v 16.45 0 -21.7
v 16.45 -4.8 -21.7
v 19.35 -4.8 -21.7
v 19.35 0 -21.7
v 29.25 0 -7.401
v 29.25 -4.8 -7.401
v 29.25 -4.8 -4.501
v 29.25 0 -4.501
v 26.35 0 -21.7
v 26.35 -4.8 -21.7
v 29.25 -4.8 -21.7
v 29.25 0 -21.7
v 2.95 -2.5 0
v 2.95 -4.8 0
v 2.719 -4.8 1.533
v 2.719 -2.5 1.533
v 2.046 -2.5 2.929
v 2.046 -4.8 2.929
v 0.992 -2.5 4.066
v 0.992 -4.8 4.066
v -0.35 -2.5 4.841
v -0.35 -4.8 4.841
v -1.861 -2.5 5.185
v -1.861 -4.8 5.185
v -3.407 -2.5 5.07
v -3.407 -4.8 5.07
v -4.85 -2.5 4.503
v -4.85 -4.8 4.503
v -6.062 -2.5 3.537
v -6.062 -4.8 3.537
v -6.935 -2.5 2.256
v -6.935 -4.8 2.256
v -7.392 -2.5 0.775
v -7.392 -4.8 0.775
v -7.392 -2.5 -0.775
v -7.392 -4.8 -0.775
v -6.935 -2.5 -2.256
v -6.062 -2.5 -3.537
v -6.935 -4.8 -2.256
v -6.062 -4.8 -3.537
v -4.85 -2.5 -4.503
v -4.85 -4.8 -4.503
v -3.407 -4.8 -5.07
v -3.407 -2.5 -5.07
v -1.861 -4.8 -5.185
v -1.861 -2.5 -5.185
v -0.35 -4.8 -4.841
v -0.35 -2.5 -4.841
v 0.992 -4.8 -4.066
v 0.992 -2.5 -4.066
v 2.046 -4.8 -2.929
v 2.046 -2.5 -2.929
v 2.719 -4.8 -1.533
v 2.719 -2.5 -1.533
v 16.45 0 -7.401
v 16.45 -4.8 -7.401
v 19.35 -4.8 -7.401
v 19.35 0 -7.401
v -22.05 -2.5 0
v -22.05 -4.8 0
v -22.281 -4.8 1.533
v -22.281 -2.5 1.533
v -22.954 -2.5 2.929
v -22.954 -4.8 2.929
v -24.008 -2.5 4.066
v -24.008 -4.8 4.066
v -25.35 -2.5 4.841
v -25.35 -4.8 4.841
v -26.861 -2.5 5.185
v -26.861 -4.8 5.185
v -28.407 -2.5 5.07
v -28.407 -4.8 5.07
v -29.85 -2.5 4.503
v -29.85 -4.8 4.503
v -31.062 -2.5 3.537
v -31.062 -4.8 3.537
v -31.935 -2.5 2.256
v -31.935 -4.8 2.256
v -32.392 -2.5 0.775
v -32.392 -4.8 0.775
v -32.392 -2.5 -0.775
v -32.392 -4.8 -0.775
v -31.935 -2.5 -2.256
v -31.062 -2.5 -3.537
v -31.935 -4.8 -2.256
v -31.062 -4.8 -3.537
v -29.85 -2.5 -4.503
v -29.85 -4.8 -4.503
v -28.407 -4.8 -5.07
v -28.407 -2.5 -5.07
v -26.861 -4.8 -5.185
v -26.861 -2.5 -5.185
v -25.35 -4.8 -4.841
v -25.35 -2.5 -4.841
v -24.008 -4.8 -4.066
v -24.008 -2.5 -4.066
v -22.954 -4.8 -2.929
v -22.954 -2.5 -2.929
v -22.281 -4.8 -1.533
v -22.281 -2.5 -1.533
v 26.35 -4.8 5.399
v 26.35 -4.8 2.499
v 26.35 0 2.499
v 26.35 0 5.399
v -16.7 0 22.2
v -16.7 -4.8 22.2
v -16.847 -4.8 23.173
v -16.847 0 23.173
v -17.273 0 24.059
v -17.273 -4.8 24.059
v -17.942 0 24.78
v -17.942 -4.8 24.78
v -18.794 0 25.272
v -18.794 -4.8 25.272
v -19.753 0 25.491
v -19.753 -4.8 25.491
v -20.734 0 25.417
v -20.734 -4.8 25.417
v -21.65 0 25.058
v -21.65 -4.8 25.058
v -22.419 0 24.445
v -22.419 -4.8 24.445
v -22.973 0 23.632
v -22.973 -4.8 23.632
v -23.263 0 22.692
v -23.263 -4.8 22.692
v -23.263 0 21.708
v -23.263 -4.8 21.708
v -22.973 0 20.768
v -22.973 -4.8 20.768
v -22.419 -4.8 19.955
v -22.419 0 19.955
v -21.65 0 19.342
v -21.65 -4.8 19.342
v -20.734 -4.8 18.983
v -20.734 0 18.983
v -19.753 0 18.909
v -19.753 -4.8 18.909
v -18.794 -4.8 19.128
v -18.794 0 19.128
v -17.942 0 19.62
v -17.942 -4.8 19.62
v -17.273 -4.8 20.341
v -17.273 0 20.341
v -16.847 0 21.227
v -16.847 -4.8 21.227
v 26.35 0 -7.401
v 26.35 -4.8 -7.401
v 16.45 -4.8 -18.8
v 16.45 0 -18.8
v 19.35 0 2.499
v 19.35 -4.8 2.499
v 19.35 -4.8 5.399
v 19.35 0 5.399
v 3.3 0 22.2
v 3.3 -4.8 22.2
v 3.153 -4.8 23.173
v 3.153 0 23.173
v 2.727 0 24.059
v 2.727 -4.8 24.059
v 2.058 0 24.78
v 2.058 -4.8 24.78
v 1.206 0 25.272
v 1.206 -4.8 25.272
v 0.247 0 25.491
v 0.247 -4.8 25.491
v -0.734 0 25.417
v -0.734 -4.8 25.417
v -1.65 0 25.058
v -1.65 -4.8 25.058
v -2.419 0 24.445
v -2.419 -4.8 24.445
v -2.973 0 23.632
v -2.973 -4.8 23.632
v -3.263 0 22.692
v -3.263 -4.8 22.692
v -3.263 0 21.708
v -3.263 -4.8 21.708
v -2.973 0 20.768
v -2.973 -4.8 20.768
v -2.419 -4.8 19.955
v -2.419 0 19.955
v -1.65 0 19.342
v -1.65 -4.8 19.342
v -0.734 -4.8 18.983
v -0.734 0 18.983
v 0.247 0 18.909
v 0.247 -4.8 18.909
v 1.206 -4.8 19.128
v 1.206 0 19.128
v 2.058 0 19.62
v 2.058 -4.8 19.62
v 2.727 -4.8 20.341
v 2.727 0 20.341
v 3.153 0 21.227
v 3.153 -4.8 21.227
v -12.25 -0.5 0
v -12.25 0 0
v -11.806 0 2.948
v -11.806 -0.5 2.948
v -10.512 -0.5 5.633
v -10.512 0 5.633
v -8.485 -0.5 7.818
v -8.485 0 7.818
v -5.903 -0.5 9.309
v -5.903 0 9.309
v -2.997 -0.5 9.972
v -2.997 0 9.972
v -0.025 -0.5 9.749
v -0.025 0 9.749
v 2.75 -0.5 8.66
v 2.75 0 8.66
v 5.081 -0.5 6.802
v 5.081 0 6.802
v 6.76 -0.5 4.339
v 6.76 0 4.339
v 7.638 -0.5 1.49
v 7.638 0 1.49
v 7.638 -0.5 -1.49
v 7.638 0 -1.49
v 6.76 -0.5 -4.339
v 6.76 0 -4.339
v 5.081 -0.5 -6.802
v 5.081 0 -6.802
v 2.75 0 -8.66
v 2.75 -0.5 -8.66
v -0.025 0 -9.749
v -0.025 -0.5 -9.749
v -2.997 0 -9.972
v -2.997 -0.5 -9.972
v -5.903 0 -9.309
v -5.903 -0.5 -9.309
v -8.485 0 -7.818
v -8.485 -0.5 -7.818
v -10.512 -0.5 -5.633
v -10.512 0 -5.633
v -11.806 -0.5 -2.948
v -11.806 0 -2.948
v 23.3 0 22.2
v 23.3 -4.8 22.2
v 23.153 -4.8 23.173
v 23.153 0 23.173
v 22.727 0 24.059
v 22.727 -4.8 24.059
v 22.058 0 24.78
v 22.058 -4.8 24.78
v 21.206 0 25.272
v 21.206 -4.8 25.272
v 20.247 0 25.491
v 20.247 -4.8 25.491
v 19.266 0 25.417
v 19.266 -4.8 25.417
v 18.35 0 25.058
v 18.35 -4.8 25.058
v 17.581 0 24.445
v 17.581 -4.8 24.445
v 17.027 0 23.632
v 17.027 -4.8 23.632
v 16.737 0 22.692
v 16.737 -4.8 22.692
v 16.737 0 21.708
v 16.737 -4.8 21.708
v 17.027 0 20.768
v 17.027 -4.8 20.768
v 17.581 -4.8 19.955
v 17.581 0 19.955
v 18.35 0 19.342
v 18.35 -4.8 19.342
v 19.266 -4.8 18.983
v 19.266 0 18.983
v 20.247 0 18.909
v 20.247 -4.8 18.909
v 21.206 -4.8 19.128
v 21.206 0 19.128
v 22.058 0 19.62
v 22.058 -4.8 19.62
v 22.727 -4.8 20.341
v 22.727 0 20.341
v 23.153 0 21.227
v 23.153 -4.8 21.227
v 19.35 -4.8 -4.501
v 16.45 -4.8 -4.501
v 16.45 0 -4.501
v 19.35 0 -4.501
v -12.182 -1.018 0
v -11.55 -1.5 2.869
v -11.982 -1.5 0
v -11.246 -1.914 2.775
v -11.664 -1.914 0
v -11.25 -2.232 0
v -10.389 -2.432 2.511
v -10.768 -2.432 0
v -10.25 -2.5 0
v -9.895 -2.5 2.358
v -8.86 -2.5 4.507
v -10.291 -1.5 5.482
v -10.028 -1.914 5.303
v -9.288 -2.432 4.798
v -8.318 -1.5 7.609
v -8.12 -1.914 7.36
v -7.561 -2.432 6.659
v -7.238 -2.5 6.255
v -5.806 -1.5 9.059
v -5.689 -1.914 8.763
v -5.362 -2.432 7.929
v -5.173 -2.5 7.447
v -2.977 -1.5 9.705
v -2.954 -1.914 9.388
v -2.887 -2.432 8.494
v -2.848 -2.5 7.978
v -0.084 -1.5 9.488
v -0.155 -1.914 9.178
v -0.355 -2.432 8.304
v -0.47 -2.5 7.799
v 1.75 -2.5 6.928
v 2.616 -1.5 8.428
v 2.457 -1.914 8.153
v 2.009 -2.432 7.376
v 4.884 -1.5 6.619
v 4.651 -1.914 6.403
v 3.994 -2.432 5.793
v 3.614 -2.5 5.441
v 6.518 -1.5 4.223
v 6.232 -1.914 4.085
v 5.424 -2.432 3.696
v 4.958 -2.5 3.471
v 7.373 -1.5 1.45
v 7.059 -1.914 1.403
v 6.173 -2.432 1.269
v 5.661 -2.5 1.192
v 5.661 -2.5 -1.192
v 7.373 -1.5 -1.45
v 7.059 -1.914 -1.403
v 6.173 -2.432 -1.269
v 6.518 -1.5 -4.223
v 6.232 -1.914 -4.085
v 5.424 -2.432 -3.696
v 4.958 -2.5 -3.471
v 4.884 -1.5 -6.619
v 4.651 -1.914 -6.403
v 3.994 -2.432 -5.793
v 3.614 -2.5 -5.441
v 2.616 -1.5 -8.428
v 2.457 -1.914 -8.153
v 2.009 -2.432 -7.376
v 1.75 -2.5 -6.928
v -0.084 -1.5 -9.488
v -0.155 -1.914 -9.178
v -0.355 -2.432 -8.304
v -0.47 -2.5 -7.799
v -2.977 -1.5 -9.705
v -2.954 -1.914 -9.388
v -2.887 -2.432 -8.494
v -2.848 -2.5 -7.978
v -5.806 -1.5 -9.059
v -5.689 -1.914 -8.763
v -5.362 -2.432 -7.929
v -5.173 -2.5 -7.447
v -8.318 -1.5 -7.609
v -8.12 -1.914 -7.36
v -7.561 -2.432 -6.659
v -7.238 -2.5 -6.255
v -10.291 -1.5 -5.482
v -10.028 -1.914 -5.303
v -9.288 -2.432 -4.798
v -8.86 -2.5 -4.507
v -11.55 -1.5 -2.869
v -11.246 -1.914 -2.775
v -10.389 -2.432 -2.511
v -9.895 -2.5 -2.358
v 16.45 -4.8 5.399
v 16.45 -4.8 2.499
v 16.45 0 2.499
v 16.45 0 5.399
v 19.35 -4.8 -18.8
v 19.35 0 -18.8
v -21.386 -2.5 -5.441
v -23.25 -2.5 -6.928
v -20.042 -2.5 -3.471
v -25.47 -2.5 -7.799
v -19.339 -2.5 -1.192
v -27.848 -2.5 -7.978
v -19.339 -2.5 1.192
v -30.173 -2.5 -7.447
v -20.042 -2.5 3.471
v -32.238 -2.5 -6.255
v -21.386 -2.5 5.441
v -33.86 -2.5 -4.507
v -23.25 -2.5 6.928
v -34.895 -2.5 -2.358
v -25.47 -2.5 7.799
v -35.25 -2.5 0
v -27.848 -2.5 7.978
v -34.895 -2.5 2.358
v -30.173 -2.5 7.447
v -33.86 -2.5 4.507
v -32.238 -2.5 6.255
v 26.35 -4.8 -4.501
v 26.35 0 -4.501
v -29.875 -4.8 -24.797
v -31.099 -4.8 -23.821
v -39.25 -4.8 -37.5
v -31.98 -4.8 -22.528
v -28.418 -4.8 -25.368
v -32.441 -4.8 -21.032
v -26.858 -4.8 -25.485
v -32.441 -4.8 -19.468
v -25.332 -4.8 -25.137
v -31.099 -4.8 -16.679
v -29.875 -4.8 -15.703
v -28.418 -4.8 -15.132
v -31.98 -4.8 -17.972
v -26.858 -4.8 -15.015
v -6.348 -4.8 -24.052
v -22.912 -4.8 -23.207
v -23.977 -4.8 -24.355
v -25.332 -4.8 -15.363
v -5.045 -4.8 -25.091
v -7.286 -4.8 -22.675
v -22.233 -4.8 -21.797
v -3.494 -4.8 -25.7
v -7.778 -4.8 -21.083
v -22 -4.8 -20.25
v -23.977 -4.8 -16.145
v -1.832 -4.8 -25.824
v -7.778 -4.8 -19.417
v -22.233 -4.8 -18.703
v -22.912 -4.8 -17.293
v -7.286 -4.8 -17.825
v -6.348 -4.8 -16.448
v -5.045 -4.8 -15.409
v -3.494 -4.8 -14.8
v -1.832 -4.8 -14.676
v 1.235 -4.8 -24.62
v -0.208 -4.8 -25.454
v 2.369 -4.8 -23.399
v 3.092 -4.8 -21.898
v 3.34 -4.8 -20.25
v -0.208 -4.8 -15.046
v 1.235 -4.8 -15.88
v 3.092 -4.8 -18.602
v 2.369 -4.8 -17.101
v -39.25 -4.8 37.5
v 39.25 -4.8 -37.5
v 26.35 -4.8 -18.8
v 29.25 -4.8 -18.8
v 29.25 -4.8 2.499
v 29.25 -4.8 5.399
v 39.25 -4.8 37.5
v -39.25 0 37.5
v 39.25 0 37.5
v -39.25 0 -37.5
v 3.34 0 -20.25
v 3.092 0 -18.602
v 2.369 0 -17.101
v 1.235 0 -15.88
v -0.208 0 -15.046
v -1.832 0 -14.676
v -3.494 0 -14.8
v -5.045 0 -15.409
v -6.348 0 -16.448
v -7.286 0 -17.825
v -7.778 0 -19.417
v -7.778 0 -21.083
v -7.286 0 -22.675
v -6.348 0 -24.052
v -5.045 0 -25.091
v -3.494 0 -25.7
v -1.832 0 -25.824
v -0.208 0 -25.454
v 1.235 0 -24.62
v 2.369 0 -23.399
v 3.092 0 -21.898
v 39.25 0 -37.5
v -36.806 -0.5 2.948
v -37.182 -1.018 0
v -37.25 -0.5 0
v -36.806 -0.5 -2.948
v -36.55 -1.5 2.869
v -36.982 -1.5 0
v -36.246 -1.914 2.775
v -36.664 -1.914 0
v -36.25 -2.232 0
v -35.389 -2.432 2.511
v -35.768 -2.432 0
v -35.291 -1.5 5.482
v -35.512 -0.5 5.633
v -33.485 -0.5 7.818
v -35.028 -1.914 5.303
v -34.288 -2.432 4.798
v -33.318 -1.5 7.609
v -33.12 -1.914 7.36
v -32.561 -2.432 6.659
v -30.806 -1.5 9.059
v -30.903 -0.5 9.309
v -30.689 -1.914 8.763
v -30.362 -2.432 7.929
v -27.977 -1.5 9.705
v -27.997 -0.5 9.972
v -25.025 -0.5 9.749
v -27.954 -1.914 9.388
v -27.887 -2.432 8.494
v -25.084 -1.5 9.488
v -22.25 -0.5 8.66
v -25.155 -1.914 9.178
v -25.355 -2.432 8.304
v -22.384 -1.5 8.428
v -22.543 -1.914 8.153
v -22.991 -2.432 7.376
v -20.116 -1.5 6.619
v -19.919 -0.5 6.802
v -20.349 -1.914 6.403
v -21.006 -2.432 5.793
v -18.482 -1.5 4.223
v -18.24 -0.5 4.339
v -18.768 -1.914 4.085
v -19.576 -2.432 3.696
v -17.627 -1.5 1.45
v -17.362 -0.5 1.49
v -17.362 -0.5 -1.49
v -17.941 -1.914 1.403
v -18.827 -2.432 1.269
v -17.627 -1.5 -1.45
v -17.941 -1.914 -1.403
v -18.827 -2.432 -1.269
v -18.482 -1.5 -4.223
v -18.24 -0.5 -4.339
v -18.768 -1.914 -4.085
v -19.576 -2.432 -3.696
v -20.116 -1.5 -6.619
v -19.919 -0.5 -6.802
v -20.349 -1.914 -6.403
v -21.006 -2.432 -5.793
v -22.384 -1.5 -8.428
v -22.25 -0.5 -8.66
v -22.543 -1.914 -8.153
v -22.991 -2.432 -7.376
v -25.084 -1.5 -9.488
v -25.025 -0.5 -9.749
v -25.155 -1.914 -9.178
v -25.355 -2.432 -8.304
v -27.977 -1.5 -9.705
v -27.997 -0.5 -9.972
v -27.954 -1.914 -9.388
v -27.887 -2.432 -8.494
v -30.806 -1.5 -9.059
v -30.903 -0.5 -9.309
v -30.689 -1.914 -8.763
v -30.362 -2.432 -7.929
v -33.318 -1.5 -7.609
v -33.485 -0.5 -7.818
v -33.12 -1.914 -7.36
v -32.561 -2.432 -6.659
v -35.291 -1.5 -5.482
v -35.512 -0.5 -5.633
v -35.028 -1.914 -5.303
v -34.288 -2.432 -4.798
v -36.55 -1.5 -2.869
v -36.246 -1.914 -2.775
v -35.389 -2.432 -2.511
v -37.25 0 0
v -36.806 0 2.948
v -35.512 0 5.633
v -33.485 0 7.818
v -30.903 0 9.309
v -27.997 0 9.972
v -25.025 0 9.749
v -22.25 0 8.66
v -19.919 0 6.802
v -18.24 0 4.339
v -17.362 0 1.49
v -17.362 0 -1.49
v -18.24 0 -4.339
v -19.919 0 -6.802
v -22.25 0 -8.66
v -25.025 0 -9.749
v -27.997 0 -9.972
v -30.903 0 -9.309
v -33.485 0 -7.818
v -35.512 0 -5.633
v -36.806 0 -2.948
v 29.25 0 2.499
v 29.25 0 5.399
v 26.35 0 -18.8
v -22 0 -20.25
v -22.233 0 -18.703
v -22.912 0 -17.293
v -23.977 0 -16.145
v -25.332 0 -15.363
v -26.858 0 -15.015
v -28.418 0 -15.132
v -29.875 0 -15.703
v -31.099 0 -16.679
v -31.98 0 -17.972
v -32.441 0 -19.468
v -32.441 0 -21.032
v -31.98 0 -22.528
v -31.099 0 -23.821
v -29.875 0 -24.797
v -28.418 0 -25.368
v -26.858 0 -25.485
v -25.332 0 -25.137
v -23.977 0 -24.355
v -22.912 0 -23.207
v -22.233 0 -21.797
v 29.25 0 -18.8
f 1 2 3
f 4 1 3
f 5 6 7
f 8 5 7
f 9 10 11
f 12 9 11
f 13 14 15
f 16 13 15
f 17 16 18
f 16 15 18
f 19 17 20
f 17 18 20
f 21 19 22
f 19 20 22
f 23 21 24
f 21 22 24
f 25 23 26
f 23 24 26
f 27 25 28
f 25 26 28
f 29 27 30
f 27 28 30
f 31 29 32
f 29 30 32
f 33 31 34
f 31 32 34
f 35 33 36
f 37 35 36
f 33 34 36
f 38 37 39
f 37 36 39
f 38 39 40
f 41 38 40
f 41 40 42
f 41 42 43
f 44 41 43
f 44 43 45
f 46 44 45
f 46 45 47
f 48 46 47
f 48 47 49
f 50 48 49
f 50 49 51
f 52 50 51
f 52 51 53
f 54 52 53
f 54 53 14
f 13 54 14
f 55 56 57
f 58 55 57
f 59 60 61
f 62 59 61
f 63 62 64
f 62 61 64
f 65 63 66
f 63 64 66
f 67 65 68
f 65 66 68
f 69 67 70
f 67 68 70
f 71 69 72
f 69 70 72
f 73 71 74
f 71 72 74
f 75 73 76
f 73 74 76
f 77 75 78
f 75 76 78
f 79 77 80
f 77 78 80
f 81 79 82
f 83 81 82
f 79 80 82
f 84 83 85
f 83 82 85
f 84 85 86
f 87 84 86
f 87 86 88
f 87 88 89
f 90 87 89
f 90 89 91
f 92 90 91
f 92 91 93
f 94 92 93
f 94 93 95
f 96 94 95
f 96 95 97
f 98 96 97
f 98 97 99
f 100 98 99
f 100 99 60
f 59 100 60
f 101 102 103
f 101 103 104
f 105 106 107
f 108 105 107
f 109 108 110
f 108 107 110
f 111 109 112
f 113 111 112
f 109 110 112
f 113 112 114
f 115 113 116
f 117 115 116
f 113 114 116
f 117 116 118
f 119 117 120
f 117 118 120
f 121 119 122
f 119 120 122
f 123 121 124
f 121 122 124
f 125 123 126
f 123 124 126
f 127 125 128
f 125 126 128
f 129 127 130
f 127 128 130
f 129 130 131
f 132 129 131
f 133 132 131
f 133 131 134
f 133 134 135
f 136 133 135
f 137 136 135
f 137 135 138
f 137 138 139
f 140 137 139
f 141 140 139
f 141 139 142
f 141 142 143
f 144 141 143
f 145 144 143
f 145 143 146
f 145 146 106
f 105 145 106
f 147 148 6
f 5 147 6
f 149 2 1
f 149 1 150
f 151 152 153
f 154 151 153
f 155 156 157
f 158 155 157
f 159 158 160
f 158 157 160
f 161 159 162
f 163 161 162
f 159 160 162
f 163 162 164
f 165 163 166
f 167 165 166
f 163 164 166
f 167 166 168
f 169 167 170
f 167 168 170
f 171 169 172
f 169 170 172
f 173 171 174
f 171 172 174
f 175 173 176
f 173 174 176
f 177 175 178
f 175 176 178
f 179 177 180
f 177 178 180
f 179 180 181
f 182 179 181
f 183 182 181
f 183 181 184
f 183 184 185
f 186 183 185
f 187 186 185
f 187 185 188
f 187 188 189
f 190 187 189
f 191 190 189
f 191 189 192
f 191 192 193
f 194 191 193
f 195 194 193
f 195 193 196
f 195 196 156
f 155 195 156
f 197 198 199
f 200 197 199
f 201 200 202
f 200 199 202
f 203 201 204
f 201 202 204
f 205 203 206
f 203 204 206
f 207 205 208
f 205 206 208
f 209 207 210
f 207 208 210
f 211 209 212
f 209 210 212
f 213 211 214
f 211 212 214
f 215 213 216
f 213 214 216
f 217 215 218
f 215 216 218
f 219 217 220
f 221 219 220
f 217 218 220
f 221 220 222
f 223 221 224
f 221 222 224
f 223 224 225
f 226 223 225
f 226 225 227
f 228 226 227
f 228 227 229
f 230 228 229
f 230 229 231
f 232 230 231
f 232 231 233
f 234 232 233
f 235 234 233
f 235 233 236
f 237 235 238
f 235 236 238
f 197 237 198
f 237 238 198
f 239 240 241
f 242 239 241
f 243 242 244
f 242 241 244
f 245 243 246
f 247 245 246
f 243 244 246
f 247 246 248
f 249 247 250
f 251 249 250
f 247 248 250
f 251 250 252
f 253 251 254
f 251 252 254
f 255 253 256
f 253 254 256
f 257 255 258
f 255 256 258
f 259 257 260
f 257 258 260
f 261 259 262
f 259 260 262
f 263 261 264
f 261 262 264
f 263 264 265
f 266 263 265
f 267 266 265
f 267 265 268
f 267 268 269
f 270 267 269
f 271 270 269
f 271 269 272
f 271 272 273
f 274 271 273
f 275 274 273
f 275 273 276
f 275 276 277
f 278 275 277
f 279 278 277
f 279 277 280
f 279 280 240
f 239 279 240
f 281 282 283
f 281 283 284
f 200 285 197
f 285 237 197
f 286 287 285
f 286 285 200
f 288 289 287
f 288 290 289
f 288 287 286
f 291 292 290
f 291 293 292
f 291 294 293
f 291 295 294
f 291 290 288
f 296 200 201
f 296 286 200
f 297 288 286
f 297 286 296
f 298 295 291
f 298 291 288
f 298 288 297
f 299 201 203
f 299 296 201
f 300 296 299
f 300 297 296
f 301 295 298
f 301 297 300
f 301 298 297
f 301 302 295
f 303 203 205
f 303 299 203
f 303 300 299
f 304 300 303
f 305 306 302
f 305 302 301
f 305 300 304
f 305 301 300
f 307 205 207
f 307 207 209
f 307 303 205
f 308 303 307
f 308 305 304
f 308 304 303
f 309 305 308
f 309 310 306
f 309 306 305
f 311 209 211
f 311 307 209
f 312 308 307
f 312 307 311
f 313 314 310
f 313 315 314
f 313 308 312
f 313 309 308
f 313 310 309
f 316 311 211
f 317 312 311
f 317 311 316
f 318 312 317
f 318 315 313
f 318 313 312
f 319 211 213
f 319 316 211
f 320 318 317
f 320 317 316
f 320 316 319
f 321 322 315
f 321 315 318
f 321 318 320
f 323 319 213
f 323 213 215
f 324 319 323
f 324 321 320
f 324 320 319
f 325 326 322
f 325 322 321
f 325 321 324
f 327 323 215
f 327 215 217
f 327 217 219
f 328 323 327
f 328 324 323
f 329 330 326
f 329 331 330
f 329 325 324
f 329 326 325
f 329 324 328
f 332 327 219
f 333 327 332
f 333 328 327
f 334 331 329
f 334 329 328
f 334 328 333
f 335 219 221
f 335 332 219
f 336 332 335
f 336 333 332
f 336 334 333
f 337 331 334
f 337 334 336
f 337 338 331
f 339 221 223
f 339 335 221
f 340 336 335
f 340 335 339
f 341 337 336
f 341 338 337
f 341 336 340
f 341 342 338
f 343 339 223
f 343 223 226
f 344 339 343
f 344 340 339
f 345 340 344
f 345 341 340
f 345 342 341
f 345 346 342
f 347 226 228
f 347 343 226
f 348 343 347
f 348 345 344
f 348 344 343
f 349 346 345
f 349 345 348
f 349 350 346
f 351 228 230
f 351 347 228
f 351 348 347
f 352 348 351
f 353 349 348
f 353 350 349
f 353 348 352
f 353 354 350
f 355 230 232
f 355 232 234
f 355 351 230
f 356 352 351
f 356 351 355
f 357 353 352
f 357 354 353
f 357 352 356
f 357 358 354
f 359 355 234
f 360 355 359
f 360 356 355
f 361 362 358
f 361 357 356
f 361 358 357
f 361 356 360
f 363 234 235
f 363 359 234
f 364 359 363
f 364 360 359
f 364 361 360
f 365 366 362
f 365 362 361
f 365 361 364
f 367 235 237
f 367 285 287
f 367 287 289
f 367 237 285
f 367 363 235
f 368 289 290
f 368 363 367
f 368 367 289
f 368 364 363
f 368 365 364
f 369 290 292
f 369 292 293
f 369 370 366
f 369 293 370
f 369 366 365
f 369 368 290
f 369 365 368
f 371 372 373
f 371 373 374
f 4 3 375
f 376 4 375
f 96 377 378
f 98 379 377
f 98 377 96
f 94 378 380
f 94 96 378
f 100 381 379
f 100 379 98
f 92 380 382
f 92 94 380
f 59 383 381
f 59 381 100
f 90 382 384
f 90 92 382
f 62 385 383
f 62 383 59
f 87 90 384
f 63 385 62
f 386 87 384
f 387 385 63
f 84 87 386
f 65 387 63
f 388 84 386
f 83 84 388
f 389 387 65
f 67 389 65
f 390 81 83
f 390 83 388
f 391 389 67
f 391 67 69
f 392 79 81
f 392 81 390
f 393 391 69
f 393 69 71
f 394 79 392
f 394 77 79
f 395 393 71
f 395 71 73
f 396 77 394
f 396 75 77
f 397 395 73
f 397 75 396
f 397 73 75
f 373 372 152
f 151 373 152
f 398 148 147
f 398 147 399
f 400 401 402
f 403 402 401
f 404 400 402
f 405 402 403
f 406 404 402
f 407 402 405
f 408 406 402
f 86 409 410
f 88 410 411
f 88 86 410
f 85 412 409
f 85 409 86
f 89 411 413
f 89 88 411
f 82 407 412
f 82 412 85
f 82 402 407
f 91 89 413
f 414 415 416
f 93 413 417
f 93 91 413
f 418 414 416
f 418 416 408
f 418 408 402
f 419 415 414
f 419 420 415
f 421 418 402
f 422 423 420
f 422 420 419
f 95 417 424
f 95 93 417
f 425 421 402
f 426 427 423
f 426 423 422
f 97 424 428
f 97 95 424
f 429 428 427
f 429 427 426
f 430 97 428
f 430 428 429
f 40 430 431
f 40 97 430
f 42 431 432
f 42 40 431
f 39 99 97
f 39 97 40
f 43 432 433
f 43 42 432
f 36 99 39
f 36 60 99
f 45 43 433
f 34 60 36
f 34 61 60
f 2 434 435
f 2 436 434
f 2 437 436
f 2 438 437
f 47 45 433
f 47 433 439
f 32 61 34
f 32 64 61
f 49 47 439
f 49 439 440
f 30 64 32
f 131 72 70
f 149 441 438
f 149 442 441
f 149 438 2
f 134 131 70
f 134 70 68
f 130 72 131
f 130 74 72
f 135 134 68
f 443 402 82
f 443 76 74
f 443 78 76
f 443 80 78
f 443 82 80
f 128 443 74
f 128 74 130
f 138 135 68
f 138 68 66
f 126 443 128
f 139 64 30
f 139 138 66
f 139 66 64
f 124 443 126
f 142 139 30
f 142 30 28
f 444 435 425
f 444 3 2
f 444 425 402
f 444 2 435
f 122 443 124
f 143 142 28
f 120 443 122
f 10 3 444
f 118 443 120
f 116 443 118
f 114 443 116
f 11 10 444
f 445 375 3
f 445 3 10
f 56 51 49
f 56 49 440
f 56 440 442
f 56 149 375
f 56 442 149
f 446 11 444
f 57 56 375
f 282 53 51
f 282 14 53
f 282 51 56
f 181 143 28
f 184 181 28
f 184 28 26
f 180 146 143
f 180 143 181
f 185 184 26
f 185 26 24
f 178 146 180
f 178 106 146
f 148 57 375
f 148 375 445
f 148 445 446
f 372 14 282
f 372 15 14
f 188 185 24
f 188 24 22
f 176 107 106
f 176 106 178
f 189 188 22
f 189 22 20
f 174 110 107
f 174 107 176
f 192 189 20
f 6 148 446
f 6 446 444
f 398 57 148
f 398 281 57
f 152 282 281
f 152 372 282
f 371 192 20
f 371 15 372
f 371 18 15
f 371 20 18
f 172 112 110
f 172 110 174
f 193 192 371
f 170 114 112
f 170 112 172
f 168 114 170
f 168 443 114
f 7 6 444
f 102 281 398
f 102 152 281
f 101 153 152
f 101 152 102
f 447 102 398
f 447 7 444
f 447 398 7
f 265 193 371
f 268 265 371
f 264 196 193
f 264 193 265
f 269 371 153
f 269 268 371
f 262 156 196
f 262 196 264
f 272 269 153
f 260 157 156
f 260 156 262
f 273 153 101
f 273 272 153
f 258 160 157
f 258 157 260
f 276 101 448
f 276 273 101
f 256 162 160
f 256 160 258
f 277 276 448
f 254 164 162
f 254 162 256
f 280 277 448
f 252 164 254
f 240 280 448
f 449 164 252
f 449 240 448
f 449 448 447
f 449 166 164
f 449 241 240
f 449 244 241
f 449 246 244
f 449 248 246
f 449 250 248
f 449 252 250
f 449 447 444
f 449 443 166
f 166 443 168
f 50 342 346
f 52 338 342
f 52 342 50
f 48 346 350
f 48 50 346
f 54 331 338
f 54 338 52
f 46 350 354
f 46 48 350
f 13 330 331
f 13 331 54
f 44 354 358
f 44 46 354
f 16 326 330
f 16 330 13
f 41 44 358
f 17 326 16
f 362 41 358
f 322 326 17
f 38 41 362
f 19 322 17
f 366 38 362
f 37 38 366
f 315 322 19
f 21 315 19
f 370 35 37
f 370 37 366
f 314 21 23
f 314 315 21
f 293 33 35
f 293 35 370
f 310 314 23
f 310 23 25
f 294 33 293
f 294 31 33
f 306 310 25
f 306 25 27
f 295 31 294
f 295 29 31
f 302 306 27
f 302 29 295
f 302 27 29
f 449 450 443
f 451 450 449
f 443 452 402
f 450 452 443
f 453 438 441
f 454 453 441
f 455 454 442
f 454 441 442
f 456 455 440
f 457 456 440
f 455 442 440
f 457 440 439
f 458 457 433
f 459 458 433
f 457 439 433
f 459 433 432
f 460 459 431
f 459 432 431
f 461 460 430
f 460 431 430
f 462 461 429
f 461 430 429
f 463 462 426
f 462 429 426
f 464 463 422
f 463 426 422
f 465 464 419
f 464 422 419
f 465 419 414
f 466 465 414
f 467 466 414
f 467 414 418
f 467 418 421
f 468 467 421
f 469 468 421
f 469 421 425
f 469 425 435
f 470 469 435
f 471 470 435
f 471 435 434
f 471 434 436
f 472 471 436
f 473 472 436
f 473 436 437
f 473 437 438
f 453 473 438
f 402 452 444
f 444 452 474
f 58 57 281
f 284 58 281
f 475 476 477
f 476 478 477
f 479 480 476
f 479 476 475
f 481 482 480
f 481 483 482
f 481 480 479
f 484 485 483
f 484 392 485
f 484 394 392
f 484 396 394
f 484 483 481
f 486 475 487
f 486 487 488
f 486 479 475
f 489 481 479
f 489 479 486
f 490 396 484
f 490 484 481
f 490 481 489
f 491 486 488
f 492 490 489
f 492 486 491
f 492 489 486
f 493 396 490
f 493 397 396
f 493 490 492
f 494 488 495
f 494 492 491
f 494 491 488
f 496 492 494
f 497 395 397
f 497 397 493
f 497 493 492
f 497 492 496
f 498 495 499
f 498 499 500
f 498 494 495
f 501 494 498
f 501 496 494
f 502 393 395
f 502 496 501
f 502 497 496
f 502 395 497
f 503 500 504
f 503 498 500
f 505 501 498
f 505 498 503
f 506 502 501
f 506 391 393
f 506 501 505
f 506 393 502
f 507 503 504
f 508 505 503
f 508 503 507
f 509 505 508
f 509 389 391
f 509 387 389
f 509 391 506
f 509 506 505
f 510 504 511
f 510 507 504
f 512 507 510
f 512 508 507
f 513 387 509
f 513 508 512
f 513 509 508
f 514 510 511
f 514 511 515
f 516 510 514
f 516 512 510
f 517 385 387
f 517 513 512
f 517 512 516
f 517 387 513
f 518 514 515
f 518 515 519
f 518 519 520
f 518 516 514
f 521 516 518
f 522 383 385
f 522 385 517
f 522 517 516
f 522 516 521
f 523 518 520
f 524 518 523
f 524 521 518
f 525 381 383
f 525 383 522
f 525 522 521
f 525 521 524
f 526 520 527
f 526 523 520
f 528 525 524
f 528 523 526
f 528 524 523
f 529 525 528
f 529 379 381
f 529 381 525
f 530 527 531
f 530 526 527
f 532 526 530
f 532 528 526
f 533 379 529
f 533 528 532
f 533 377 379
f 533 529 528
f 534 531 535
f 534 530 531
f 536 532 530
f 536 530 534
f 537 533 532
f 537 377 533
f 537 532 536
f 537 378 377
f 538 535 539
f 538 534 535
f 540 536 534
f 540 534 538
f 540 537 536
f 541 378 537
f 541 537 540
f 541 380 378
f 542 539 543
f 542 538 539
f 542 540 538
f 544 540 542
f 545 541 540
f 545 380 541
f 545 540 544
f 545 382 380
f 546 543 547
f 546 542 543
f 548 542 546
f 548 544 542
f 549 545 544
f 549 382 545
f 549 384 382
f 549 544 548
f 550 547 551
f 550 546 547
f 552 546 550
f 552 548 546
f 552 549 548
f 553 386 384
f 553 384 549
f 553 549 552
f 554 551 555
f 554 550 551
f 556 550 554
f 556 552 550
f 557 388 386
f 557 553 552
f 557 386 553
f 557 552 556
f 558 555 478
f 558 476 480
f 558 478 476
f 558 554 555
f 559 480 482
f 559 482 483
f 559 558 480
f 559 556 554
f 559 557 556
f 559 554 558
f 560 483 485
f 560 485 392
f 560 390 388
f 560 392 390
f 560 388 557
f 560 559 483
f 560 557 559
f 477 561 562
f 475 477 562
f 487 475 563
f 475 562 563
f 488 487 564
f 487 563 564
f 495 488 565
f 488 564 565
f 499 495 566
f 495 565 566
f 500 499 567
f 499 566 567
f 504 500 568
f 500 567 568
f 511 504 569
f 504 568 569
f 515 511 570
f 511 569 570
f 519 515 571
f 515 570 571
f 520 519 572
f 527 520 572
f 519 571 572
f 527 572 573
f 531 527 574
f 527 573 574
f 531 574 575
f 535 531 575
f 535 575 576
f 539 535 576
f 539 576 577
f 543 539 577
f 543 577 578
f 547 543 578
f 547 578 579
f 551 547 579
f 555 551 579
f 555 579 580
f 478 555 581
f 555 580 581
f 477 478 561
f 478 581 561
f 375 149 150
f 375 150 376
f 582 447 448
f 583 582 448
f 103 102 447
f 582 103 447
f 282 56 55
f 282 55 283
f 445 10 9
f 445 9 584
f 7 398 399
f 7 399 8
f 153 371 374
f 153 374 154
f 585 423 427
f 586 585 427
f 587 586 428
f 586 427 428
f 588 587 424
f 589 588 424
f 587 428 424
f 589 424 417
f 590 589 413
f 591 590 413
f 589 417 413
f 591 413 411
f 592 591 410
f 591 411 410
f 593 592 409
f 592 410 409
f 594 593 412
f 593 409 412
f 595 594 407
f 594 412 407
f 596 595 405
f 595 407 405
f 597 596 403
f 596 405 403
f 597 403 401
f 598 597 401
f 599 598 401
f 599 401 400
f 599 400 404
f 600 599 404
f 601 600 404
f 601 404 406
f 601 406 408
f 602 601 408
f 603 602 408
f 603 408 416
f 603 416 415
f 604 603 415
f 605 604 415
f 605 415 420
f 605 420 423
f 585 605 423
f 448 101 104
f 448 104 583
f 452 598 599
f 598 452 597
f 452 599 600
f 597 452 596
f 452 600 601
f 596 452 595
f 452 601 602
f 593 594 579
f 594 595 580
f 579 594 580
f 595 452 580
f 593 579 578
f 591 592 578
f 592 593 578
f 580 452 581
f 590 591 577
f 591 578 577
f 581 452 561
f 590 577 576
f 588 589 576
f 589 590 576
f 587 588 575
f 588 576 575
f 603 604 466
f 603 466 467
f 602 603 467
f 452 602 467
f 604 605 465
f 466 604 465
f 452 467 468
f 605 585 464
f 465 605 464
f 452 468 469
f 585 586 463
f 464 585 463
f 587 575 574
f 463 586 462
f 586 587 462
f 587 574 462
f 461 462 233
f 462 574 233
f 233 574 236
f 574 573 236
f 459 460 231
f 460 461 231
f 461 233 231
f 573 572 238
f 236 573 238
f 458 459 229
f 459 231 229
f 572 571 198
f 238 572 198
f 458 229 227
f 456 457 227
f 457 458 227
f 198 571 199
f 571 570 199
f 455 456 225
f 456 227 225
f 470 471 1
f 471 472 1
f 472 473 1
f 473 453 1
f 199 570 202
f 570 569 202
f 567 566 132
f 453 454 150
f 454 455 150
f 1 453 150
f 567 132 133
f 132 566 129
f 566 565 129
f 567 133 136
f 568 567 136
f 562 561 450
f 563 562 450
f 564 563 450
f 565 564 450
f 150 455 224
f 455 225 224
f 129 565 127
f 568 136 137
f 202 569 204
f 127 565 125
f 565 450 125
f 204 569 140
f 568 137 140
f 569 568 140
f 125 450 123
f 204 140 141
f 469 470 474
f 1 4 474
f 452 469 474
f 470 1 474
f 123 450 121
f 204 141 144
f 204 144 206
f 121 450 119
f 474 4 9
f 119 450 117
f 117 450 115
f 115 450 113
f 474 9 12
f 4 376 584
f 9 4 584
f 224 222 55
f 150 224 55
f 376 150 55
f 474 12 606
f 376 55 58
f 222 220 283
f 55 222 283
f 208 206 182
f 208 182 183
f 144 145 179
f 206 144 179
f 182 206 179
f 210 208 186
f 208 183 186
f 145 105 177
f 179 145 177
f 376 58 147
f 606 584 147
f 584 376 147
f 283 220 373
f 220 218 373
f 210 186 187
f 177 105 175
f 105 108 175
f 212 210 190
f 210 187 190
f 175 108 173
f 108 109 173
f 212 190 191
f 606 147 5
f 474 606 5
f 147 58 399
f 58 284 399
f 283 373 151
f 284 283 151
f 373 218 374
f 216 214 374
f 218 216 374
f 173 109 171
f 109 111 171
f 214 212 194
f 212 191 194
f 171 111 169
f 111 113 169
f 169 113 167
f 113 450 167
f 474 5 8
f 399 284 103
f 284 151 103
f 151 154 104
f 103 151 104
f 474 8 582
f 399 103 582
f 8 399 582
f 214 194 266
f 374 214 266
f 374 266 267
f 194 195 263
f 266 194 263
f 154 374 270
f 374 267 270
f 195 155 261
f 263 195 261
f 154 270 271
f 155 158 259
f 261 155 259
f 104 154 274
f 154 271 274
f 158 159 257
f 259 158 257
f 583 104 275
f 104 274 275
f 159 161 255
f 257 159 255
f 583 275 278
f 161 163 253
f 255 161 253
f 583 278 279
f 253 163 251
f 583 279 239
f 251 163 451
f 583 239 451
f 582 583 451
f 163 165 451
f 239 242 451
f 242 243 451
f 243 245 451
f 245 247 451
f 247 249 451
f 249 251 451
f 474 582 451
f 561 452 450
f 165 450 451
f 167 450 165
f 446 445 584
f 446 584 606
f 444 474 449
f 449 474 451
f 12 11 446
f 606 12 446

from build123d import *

# Parameters (mm, degrees)
F0_W     = 78.5
F0_H     = 75
F1_DEPTH = 4.8
F2_R     = 5.2
F2_R_2   = 5.25
F2_R_3   = 5.59
F2_R_4   = 3.3
F2_W     = 2.9
F2_H     = 2.9
F3_DEPTH = 4.801
F4_R     = 10
F5_DEPTH = 2.5
F6_R     = 2


with BuildPart() as f1:
    # F0 (on Front) → F1 (new body)
    with BuildSketch(Plane.XZ):
        Rectangle(F0_W, F0_H)
    extrude(amount=F1_DEPTH)

    # F2 (on face) → F3 (cut, through all)
    with BuildSketch(Plane.XZ.offset(4.8)):
        with Locations((-27.25, 0)):
            Circle(F2_R)
        with Locations((-27.25, -20.25)):
            Circle(F2_R_2)
        with Locations((-2.25, -20.25)):
            Circle(F2_R_3)
        with Locations((-2.25, 0)):
            Circle(F2_R)
        with Locations((0, 22.2)):
            Circle(F2_R_4)
        with Locations((-20, 22.2)):
            Circle(F2_R_4)
        with Locations((20, 22.2)):
            Circle(F2_R_4)
        with Locations((17.9, 3.948761)):
            Rectangle(F2_W, F2_H)
        with Locations((27.8, 3.948761)):
            Rectangle(F2_W, F2_H)
        with Locations((17.9, -5.951239)):
            Rectangle(F2_W, F2_H)
        with Locations((27.8, -5.951239)):
            Rectangle(F2_W, F2_H)
        with Locations((17.9, -20.25)):
            Rectangle(F2_W, F2_H)
        with Locations((27.8, -20.25)):
            Rectangle(F2_W, F2_H)
    extrude(amount=-F3_DEPTH, mode=Mode.SUBTRACT)

    # F4 (on face) → F5 (cut)
    with BuildSketch(Plane(origin=(0, 0, 0), x_dir=(-1, 0, 0), z_dir=(0, 1, 0))):
        with Locations((2.25, 0)):
            Circle(F4_R)
        with Locations((27.25, 0)):
            Circle(F4_R)
    extrude(amount=-F5_DEPTH, mode=Mode.SUBTRACT)

    # F6
    f6_edges = [f1.edges().sort_by_distance(p)[0] for p in [
        (7.75, -2.5, 0),
        (-17.25, -2.5, 0),
    ]]
    fillet(f6_edges, radius=F6_R)


solid = f1.part
